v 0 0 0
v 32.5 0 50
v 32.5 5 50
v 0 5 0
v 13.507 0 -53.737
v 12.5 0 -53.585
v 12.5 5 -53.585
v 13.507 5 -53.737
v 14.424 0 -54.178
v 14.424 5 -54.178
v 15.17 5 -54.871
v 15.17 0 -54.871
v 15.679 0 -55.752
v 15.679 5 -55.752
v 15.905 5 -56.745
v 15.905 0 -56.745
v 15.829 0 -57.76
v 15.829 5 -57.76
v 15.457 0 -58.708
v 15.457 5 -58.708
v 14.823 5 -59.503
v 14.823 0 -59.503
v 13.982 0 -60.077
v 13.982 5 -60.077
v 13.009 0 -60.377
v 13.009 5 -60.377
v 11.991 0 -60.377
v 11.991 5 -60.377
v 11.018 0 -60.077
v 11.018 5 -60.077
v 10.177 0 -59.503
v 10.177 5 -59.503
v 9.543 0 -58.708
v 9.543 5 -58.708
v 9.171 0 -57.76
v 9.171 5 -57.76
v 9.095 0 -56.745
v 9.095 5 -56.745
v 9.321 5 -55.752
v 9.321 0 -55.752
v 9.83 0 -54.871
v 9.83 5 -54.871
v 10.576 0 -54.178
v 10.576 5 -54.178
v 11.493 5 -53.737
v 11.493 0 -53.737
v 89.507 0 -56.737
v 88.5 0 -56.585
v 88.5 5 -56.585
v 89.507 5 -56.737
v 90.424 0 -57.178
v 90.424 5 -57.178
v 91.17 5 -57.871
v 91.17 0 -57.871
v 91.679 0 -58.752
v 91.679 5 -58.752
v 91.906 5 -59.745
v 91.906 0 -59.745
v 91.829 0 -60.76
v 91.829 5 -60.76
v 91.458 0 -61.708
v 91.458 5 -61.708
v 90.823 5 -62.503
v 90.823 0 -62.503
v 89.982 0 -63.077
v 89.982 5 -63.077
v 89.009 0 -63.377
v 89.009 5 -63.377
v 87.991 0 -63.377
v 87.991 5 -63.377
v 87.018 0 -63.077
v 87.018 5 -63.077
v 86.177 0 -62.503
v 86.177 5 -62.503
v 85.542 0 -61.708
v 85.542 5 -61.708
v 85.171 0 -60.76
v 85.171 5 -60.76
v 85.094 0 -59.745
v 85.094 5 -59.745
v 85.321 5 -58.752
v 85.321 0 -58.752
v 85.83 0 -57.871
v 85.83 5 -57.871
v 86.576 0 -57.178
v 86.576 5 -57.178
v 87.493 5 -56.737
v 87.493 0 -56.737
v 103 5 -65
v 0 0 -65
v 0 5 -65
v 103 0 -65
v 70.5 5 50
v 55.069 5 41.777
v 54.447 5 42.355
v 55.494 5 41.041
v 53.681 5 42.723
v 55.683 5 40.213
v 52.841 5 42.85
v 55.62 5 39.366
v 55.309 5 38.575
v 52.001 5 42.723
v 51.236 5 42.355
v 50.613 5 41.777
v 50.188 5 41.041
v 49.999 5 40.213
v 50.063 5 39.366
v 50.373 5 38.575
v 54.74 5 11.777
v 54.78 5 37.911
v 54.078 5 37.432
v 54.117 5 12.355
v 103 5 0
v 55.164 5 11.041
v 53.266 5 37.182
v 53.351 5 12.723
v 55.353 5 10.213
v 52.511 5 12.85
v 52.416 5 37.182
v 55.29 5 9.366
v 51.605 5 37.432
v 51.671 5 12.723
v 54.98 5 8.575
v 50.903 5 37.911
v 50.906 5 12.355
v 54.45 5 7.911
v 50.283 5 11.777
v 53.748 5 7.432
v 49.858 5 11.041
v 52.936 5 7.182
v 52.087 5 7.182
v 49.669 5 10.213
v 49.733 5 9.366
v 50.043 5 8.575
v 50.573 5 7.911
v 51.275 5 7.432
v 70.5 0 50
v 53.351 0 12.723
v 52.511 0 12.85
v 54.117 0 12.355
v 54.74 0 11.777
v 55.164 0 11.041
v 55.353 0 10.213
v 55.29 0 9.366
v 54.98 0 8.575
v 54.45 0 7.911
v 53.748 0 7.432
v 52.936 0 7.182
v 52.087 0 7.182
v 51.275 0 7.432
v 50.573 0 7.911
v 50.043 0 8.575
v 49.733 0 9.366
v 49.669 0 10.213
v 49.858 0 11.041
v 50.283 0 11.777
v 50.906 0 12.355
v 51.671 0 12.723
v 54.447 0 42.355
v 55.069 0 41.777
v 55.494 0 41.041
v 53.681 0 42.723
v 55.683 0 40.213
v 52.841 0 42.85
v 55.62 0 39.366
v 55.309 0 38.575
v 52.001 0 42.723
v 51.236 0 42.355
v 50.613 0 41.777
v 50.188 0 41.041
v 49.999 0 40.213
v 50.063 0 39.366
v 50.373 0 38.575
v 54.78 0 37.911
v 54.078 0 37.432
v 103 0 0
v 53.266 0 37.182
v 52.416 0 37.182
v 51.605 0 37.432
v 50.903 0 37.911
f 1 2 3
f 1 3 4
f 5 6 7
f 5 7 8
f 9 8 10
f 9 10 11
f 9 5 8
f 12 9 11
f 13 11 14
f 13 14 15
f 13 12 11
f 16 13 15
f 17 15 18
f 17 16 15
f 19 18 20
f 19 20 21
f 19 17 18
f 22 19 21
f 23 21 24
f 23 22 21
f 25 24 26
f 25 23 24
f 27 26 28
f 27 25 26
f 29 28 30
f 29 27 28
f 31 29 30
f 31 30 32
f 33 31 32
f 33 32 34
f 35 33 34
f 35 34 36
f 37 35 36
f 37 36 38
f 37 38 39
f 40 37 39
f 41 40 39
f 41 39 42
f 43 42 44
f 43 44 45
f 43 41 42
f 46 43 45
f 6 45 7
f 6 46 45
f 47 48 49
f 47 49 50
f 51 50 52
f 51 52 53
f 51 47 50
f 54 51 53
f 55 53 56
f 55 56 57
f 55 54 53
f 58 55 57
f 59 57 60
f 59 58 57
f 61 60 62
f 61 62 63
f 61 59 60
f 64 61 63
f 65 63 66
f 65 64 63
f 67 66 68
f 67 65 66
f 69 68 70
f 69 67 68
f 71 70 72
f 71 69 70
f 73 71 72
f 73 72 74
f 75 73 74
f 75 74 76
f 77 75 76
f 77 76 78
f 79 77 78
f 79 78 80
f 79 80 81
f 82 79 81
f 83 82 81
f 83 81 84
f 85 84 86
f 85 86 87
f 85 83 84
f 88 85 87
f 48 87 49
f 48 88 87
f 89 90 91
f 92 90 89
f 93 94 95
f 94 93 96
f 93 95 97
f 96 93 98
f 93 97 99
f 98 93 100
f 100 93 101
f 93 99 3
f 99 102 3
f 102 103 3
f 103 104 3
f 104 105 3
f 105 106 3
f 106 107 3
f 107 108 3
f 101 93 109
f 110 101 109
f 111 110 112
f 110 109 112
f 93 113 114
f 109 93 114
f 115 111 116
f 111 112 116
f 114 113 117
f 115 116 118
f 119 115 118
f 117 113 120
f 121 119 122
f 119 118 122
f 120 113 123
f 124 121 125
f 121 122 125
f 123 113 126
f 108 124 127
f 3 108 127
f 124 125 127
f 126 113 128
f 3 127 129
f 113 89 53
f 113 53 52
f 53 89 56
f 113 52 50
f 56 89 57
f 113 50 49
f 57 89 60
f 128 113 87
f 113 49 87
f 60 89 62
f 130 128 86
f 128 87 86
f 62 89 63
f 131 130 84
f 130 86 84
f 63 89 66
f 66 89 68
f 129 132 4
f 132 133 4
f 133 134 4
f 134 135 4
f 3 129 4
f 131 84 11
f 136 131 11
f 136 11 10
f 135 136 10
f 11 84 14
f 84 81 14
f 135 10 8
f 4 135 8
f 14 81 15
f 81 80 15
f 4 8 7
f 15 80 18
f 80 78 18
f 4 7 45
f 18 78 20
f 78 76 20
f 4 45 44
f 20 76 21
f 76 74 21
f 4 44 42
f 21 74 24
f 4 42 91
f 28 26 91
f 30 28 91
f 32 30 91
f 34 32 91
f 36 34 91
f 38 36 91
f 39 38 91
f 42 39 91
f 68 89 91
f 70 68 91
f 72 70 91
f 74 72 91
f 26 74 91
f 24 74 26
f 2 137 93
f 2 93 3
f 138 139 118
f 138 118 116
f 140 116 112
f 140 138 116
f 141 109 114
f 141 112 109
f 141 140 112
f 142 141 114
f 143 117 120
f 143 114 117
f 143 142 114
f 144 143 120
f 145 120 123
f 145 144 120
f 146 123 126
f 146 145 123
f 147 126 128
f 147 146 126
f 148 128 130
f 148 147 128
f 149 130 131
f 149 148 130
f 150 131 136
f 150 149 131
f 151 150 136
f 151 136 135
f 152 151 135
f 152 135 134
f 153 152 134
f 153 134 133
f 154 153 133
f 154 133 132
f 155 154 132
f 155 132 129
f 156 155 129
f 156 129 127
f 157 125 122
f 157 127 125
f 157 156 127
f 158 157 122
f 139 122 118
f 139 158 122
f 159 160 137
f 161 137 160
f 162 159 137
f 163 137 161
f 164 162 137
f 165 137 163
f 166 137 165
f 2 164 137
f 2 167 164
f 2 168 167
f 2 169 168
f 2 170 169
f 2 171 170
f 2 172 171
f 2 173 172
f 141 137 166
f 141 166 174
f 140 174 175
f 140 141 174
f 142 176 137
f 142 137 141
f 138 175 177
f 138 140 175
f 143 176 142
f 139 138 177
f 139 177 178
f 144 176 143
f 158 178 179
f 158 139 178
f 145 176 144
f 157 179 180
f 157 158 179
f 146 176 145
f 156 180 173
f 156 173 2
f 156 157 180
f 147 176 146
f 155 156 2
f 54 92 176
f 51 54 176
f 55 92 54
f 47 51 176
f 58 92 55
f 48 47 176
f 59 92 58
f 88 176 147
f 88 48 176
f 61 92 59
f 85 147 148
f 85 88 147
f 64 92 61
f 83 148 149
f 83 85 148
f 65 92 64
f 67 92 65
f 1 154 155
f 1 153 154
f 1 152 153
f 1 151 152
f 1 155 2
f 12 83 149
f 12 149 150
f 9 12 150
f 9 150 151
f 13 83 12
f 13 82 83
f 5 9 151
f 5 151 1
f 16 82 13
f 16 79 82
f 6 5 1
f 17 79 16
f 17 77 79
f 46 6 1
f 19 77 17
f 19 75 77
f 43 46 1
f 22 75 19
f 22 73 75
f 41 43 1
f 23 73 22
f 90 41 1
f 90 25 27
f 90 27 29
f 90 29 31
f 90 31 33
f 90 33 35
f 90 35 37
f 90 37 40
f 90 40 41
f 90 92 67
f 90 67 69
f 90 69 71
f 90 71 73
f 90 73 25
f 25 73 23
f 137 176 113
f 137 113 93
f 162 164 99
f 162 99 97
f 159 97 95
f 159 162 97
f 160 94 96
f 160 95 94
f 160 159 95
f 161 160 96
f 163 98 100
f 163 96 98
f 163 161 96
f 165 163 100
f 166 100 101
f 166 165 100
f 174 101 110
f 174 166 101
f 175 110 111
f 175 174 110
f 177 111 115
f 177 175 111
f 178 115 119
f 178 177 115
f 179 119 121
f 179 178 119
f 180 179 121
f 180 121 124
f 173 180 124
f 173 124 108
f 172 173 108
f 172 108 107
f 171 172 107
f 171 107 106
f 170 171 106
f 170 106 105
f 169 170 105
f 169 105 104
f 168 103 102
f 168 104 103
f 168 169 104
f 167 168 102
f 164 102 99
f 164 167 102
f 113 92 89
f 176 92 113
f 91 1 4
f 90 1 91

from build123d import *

# Parameters (mm, degrees)
SKETCH1_R               = 3.415098232
SKETCH1_R_2             = 3.415
BOSS_EXTRUDE1_DEPTH     = 5
CUT_EXTRUDE1_DEPTH      = 122.897497923
CUT_EXTRUDE1_DEPTH_BACK = 122.897497923
SKETCH2_R               = 2.85


with BuildPart() as part:
    # Sketch1 → Boss-Extrude1 (new body)
    with BuildSketch(Plane(origin=(0, 0, 0), x_dir=(1, 0, 0), z_dir=(0, 1, 0))):
        Polygon((0, 0), (0, 65), (103, 65), (103, 0), (70.5, -50), (32.5, -50), align=None)
        with Locations(Location((88.5, 60, 0), (0, 0, 270))):
            Circle(SKETCH1_R, mode=Mode.SUBTRACT)
        with Locations(Location((12.5, 57, 0), (0, 0, 270))):
            Circle(SKETCH1_R_2, mode=Mode.SUBTRACT)
    extrude(amount=BOSS_EXTRUDE1_DEPTH)

    # Sketch2 → Cut-Extrude1 (cut, two sides: drawn at the far end of the back side and taken through both)
    with BuildSketch(Plane(origin=(0, 5, 0), x_dir=(1, 0, 0), z_dir=(0, 1, 0)).offset(-CUT_EXTRUDE1_DEPTH_BACK)):
        with Locations(Location((52.841163777, -40, 0), (0, 0, 270))):
            Circle(SKETCH2_R)
        with Locations(Location((52.511369406, -10, 0), (0, 0, 270))):
            Circle(SKETCH2_R)
    extrude(amount=CUT_EXTRUDE1_DEPTH + CUT_EXTRUDE1_DEPTH_BACK, mode=Mode.SUBTRACT)


solid = part.part
